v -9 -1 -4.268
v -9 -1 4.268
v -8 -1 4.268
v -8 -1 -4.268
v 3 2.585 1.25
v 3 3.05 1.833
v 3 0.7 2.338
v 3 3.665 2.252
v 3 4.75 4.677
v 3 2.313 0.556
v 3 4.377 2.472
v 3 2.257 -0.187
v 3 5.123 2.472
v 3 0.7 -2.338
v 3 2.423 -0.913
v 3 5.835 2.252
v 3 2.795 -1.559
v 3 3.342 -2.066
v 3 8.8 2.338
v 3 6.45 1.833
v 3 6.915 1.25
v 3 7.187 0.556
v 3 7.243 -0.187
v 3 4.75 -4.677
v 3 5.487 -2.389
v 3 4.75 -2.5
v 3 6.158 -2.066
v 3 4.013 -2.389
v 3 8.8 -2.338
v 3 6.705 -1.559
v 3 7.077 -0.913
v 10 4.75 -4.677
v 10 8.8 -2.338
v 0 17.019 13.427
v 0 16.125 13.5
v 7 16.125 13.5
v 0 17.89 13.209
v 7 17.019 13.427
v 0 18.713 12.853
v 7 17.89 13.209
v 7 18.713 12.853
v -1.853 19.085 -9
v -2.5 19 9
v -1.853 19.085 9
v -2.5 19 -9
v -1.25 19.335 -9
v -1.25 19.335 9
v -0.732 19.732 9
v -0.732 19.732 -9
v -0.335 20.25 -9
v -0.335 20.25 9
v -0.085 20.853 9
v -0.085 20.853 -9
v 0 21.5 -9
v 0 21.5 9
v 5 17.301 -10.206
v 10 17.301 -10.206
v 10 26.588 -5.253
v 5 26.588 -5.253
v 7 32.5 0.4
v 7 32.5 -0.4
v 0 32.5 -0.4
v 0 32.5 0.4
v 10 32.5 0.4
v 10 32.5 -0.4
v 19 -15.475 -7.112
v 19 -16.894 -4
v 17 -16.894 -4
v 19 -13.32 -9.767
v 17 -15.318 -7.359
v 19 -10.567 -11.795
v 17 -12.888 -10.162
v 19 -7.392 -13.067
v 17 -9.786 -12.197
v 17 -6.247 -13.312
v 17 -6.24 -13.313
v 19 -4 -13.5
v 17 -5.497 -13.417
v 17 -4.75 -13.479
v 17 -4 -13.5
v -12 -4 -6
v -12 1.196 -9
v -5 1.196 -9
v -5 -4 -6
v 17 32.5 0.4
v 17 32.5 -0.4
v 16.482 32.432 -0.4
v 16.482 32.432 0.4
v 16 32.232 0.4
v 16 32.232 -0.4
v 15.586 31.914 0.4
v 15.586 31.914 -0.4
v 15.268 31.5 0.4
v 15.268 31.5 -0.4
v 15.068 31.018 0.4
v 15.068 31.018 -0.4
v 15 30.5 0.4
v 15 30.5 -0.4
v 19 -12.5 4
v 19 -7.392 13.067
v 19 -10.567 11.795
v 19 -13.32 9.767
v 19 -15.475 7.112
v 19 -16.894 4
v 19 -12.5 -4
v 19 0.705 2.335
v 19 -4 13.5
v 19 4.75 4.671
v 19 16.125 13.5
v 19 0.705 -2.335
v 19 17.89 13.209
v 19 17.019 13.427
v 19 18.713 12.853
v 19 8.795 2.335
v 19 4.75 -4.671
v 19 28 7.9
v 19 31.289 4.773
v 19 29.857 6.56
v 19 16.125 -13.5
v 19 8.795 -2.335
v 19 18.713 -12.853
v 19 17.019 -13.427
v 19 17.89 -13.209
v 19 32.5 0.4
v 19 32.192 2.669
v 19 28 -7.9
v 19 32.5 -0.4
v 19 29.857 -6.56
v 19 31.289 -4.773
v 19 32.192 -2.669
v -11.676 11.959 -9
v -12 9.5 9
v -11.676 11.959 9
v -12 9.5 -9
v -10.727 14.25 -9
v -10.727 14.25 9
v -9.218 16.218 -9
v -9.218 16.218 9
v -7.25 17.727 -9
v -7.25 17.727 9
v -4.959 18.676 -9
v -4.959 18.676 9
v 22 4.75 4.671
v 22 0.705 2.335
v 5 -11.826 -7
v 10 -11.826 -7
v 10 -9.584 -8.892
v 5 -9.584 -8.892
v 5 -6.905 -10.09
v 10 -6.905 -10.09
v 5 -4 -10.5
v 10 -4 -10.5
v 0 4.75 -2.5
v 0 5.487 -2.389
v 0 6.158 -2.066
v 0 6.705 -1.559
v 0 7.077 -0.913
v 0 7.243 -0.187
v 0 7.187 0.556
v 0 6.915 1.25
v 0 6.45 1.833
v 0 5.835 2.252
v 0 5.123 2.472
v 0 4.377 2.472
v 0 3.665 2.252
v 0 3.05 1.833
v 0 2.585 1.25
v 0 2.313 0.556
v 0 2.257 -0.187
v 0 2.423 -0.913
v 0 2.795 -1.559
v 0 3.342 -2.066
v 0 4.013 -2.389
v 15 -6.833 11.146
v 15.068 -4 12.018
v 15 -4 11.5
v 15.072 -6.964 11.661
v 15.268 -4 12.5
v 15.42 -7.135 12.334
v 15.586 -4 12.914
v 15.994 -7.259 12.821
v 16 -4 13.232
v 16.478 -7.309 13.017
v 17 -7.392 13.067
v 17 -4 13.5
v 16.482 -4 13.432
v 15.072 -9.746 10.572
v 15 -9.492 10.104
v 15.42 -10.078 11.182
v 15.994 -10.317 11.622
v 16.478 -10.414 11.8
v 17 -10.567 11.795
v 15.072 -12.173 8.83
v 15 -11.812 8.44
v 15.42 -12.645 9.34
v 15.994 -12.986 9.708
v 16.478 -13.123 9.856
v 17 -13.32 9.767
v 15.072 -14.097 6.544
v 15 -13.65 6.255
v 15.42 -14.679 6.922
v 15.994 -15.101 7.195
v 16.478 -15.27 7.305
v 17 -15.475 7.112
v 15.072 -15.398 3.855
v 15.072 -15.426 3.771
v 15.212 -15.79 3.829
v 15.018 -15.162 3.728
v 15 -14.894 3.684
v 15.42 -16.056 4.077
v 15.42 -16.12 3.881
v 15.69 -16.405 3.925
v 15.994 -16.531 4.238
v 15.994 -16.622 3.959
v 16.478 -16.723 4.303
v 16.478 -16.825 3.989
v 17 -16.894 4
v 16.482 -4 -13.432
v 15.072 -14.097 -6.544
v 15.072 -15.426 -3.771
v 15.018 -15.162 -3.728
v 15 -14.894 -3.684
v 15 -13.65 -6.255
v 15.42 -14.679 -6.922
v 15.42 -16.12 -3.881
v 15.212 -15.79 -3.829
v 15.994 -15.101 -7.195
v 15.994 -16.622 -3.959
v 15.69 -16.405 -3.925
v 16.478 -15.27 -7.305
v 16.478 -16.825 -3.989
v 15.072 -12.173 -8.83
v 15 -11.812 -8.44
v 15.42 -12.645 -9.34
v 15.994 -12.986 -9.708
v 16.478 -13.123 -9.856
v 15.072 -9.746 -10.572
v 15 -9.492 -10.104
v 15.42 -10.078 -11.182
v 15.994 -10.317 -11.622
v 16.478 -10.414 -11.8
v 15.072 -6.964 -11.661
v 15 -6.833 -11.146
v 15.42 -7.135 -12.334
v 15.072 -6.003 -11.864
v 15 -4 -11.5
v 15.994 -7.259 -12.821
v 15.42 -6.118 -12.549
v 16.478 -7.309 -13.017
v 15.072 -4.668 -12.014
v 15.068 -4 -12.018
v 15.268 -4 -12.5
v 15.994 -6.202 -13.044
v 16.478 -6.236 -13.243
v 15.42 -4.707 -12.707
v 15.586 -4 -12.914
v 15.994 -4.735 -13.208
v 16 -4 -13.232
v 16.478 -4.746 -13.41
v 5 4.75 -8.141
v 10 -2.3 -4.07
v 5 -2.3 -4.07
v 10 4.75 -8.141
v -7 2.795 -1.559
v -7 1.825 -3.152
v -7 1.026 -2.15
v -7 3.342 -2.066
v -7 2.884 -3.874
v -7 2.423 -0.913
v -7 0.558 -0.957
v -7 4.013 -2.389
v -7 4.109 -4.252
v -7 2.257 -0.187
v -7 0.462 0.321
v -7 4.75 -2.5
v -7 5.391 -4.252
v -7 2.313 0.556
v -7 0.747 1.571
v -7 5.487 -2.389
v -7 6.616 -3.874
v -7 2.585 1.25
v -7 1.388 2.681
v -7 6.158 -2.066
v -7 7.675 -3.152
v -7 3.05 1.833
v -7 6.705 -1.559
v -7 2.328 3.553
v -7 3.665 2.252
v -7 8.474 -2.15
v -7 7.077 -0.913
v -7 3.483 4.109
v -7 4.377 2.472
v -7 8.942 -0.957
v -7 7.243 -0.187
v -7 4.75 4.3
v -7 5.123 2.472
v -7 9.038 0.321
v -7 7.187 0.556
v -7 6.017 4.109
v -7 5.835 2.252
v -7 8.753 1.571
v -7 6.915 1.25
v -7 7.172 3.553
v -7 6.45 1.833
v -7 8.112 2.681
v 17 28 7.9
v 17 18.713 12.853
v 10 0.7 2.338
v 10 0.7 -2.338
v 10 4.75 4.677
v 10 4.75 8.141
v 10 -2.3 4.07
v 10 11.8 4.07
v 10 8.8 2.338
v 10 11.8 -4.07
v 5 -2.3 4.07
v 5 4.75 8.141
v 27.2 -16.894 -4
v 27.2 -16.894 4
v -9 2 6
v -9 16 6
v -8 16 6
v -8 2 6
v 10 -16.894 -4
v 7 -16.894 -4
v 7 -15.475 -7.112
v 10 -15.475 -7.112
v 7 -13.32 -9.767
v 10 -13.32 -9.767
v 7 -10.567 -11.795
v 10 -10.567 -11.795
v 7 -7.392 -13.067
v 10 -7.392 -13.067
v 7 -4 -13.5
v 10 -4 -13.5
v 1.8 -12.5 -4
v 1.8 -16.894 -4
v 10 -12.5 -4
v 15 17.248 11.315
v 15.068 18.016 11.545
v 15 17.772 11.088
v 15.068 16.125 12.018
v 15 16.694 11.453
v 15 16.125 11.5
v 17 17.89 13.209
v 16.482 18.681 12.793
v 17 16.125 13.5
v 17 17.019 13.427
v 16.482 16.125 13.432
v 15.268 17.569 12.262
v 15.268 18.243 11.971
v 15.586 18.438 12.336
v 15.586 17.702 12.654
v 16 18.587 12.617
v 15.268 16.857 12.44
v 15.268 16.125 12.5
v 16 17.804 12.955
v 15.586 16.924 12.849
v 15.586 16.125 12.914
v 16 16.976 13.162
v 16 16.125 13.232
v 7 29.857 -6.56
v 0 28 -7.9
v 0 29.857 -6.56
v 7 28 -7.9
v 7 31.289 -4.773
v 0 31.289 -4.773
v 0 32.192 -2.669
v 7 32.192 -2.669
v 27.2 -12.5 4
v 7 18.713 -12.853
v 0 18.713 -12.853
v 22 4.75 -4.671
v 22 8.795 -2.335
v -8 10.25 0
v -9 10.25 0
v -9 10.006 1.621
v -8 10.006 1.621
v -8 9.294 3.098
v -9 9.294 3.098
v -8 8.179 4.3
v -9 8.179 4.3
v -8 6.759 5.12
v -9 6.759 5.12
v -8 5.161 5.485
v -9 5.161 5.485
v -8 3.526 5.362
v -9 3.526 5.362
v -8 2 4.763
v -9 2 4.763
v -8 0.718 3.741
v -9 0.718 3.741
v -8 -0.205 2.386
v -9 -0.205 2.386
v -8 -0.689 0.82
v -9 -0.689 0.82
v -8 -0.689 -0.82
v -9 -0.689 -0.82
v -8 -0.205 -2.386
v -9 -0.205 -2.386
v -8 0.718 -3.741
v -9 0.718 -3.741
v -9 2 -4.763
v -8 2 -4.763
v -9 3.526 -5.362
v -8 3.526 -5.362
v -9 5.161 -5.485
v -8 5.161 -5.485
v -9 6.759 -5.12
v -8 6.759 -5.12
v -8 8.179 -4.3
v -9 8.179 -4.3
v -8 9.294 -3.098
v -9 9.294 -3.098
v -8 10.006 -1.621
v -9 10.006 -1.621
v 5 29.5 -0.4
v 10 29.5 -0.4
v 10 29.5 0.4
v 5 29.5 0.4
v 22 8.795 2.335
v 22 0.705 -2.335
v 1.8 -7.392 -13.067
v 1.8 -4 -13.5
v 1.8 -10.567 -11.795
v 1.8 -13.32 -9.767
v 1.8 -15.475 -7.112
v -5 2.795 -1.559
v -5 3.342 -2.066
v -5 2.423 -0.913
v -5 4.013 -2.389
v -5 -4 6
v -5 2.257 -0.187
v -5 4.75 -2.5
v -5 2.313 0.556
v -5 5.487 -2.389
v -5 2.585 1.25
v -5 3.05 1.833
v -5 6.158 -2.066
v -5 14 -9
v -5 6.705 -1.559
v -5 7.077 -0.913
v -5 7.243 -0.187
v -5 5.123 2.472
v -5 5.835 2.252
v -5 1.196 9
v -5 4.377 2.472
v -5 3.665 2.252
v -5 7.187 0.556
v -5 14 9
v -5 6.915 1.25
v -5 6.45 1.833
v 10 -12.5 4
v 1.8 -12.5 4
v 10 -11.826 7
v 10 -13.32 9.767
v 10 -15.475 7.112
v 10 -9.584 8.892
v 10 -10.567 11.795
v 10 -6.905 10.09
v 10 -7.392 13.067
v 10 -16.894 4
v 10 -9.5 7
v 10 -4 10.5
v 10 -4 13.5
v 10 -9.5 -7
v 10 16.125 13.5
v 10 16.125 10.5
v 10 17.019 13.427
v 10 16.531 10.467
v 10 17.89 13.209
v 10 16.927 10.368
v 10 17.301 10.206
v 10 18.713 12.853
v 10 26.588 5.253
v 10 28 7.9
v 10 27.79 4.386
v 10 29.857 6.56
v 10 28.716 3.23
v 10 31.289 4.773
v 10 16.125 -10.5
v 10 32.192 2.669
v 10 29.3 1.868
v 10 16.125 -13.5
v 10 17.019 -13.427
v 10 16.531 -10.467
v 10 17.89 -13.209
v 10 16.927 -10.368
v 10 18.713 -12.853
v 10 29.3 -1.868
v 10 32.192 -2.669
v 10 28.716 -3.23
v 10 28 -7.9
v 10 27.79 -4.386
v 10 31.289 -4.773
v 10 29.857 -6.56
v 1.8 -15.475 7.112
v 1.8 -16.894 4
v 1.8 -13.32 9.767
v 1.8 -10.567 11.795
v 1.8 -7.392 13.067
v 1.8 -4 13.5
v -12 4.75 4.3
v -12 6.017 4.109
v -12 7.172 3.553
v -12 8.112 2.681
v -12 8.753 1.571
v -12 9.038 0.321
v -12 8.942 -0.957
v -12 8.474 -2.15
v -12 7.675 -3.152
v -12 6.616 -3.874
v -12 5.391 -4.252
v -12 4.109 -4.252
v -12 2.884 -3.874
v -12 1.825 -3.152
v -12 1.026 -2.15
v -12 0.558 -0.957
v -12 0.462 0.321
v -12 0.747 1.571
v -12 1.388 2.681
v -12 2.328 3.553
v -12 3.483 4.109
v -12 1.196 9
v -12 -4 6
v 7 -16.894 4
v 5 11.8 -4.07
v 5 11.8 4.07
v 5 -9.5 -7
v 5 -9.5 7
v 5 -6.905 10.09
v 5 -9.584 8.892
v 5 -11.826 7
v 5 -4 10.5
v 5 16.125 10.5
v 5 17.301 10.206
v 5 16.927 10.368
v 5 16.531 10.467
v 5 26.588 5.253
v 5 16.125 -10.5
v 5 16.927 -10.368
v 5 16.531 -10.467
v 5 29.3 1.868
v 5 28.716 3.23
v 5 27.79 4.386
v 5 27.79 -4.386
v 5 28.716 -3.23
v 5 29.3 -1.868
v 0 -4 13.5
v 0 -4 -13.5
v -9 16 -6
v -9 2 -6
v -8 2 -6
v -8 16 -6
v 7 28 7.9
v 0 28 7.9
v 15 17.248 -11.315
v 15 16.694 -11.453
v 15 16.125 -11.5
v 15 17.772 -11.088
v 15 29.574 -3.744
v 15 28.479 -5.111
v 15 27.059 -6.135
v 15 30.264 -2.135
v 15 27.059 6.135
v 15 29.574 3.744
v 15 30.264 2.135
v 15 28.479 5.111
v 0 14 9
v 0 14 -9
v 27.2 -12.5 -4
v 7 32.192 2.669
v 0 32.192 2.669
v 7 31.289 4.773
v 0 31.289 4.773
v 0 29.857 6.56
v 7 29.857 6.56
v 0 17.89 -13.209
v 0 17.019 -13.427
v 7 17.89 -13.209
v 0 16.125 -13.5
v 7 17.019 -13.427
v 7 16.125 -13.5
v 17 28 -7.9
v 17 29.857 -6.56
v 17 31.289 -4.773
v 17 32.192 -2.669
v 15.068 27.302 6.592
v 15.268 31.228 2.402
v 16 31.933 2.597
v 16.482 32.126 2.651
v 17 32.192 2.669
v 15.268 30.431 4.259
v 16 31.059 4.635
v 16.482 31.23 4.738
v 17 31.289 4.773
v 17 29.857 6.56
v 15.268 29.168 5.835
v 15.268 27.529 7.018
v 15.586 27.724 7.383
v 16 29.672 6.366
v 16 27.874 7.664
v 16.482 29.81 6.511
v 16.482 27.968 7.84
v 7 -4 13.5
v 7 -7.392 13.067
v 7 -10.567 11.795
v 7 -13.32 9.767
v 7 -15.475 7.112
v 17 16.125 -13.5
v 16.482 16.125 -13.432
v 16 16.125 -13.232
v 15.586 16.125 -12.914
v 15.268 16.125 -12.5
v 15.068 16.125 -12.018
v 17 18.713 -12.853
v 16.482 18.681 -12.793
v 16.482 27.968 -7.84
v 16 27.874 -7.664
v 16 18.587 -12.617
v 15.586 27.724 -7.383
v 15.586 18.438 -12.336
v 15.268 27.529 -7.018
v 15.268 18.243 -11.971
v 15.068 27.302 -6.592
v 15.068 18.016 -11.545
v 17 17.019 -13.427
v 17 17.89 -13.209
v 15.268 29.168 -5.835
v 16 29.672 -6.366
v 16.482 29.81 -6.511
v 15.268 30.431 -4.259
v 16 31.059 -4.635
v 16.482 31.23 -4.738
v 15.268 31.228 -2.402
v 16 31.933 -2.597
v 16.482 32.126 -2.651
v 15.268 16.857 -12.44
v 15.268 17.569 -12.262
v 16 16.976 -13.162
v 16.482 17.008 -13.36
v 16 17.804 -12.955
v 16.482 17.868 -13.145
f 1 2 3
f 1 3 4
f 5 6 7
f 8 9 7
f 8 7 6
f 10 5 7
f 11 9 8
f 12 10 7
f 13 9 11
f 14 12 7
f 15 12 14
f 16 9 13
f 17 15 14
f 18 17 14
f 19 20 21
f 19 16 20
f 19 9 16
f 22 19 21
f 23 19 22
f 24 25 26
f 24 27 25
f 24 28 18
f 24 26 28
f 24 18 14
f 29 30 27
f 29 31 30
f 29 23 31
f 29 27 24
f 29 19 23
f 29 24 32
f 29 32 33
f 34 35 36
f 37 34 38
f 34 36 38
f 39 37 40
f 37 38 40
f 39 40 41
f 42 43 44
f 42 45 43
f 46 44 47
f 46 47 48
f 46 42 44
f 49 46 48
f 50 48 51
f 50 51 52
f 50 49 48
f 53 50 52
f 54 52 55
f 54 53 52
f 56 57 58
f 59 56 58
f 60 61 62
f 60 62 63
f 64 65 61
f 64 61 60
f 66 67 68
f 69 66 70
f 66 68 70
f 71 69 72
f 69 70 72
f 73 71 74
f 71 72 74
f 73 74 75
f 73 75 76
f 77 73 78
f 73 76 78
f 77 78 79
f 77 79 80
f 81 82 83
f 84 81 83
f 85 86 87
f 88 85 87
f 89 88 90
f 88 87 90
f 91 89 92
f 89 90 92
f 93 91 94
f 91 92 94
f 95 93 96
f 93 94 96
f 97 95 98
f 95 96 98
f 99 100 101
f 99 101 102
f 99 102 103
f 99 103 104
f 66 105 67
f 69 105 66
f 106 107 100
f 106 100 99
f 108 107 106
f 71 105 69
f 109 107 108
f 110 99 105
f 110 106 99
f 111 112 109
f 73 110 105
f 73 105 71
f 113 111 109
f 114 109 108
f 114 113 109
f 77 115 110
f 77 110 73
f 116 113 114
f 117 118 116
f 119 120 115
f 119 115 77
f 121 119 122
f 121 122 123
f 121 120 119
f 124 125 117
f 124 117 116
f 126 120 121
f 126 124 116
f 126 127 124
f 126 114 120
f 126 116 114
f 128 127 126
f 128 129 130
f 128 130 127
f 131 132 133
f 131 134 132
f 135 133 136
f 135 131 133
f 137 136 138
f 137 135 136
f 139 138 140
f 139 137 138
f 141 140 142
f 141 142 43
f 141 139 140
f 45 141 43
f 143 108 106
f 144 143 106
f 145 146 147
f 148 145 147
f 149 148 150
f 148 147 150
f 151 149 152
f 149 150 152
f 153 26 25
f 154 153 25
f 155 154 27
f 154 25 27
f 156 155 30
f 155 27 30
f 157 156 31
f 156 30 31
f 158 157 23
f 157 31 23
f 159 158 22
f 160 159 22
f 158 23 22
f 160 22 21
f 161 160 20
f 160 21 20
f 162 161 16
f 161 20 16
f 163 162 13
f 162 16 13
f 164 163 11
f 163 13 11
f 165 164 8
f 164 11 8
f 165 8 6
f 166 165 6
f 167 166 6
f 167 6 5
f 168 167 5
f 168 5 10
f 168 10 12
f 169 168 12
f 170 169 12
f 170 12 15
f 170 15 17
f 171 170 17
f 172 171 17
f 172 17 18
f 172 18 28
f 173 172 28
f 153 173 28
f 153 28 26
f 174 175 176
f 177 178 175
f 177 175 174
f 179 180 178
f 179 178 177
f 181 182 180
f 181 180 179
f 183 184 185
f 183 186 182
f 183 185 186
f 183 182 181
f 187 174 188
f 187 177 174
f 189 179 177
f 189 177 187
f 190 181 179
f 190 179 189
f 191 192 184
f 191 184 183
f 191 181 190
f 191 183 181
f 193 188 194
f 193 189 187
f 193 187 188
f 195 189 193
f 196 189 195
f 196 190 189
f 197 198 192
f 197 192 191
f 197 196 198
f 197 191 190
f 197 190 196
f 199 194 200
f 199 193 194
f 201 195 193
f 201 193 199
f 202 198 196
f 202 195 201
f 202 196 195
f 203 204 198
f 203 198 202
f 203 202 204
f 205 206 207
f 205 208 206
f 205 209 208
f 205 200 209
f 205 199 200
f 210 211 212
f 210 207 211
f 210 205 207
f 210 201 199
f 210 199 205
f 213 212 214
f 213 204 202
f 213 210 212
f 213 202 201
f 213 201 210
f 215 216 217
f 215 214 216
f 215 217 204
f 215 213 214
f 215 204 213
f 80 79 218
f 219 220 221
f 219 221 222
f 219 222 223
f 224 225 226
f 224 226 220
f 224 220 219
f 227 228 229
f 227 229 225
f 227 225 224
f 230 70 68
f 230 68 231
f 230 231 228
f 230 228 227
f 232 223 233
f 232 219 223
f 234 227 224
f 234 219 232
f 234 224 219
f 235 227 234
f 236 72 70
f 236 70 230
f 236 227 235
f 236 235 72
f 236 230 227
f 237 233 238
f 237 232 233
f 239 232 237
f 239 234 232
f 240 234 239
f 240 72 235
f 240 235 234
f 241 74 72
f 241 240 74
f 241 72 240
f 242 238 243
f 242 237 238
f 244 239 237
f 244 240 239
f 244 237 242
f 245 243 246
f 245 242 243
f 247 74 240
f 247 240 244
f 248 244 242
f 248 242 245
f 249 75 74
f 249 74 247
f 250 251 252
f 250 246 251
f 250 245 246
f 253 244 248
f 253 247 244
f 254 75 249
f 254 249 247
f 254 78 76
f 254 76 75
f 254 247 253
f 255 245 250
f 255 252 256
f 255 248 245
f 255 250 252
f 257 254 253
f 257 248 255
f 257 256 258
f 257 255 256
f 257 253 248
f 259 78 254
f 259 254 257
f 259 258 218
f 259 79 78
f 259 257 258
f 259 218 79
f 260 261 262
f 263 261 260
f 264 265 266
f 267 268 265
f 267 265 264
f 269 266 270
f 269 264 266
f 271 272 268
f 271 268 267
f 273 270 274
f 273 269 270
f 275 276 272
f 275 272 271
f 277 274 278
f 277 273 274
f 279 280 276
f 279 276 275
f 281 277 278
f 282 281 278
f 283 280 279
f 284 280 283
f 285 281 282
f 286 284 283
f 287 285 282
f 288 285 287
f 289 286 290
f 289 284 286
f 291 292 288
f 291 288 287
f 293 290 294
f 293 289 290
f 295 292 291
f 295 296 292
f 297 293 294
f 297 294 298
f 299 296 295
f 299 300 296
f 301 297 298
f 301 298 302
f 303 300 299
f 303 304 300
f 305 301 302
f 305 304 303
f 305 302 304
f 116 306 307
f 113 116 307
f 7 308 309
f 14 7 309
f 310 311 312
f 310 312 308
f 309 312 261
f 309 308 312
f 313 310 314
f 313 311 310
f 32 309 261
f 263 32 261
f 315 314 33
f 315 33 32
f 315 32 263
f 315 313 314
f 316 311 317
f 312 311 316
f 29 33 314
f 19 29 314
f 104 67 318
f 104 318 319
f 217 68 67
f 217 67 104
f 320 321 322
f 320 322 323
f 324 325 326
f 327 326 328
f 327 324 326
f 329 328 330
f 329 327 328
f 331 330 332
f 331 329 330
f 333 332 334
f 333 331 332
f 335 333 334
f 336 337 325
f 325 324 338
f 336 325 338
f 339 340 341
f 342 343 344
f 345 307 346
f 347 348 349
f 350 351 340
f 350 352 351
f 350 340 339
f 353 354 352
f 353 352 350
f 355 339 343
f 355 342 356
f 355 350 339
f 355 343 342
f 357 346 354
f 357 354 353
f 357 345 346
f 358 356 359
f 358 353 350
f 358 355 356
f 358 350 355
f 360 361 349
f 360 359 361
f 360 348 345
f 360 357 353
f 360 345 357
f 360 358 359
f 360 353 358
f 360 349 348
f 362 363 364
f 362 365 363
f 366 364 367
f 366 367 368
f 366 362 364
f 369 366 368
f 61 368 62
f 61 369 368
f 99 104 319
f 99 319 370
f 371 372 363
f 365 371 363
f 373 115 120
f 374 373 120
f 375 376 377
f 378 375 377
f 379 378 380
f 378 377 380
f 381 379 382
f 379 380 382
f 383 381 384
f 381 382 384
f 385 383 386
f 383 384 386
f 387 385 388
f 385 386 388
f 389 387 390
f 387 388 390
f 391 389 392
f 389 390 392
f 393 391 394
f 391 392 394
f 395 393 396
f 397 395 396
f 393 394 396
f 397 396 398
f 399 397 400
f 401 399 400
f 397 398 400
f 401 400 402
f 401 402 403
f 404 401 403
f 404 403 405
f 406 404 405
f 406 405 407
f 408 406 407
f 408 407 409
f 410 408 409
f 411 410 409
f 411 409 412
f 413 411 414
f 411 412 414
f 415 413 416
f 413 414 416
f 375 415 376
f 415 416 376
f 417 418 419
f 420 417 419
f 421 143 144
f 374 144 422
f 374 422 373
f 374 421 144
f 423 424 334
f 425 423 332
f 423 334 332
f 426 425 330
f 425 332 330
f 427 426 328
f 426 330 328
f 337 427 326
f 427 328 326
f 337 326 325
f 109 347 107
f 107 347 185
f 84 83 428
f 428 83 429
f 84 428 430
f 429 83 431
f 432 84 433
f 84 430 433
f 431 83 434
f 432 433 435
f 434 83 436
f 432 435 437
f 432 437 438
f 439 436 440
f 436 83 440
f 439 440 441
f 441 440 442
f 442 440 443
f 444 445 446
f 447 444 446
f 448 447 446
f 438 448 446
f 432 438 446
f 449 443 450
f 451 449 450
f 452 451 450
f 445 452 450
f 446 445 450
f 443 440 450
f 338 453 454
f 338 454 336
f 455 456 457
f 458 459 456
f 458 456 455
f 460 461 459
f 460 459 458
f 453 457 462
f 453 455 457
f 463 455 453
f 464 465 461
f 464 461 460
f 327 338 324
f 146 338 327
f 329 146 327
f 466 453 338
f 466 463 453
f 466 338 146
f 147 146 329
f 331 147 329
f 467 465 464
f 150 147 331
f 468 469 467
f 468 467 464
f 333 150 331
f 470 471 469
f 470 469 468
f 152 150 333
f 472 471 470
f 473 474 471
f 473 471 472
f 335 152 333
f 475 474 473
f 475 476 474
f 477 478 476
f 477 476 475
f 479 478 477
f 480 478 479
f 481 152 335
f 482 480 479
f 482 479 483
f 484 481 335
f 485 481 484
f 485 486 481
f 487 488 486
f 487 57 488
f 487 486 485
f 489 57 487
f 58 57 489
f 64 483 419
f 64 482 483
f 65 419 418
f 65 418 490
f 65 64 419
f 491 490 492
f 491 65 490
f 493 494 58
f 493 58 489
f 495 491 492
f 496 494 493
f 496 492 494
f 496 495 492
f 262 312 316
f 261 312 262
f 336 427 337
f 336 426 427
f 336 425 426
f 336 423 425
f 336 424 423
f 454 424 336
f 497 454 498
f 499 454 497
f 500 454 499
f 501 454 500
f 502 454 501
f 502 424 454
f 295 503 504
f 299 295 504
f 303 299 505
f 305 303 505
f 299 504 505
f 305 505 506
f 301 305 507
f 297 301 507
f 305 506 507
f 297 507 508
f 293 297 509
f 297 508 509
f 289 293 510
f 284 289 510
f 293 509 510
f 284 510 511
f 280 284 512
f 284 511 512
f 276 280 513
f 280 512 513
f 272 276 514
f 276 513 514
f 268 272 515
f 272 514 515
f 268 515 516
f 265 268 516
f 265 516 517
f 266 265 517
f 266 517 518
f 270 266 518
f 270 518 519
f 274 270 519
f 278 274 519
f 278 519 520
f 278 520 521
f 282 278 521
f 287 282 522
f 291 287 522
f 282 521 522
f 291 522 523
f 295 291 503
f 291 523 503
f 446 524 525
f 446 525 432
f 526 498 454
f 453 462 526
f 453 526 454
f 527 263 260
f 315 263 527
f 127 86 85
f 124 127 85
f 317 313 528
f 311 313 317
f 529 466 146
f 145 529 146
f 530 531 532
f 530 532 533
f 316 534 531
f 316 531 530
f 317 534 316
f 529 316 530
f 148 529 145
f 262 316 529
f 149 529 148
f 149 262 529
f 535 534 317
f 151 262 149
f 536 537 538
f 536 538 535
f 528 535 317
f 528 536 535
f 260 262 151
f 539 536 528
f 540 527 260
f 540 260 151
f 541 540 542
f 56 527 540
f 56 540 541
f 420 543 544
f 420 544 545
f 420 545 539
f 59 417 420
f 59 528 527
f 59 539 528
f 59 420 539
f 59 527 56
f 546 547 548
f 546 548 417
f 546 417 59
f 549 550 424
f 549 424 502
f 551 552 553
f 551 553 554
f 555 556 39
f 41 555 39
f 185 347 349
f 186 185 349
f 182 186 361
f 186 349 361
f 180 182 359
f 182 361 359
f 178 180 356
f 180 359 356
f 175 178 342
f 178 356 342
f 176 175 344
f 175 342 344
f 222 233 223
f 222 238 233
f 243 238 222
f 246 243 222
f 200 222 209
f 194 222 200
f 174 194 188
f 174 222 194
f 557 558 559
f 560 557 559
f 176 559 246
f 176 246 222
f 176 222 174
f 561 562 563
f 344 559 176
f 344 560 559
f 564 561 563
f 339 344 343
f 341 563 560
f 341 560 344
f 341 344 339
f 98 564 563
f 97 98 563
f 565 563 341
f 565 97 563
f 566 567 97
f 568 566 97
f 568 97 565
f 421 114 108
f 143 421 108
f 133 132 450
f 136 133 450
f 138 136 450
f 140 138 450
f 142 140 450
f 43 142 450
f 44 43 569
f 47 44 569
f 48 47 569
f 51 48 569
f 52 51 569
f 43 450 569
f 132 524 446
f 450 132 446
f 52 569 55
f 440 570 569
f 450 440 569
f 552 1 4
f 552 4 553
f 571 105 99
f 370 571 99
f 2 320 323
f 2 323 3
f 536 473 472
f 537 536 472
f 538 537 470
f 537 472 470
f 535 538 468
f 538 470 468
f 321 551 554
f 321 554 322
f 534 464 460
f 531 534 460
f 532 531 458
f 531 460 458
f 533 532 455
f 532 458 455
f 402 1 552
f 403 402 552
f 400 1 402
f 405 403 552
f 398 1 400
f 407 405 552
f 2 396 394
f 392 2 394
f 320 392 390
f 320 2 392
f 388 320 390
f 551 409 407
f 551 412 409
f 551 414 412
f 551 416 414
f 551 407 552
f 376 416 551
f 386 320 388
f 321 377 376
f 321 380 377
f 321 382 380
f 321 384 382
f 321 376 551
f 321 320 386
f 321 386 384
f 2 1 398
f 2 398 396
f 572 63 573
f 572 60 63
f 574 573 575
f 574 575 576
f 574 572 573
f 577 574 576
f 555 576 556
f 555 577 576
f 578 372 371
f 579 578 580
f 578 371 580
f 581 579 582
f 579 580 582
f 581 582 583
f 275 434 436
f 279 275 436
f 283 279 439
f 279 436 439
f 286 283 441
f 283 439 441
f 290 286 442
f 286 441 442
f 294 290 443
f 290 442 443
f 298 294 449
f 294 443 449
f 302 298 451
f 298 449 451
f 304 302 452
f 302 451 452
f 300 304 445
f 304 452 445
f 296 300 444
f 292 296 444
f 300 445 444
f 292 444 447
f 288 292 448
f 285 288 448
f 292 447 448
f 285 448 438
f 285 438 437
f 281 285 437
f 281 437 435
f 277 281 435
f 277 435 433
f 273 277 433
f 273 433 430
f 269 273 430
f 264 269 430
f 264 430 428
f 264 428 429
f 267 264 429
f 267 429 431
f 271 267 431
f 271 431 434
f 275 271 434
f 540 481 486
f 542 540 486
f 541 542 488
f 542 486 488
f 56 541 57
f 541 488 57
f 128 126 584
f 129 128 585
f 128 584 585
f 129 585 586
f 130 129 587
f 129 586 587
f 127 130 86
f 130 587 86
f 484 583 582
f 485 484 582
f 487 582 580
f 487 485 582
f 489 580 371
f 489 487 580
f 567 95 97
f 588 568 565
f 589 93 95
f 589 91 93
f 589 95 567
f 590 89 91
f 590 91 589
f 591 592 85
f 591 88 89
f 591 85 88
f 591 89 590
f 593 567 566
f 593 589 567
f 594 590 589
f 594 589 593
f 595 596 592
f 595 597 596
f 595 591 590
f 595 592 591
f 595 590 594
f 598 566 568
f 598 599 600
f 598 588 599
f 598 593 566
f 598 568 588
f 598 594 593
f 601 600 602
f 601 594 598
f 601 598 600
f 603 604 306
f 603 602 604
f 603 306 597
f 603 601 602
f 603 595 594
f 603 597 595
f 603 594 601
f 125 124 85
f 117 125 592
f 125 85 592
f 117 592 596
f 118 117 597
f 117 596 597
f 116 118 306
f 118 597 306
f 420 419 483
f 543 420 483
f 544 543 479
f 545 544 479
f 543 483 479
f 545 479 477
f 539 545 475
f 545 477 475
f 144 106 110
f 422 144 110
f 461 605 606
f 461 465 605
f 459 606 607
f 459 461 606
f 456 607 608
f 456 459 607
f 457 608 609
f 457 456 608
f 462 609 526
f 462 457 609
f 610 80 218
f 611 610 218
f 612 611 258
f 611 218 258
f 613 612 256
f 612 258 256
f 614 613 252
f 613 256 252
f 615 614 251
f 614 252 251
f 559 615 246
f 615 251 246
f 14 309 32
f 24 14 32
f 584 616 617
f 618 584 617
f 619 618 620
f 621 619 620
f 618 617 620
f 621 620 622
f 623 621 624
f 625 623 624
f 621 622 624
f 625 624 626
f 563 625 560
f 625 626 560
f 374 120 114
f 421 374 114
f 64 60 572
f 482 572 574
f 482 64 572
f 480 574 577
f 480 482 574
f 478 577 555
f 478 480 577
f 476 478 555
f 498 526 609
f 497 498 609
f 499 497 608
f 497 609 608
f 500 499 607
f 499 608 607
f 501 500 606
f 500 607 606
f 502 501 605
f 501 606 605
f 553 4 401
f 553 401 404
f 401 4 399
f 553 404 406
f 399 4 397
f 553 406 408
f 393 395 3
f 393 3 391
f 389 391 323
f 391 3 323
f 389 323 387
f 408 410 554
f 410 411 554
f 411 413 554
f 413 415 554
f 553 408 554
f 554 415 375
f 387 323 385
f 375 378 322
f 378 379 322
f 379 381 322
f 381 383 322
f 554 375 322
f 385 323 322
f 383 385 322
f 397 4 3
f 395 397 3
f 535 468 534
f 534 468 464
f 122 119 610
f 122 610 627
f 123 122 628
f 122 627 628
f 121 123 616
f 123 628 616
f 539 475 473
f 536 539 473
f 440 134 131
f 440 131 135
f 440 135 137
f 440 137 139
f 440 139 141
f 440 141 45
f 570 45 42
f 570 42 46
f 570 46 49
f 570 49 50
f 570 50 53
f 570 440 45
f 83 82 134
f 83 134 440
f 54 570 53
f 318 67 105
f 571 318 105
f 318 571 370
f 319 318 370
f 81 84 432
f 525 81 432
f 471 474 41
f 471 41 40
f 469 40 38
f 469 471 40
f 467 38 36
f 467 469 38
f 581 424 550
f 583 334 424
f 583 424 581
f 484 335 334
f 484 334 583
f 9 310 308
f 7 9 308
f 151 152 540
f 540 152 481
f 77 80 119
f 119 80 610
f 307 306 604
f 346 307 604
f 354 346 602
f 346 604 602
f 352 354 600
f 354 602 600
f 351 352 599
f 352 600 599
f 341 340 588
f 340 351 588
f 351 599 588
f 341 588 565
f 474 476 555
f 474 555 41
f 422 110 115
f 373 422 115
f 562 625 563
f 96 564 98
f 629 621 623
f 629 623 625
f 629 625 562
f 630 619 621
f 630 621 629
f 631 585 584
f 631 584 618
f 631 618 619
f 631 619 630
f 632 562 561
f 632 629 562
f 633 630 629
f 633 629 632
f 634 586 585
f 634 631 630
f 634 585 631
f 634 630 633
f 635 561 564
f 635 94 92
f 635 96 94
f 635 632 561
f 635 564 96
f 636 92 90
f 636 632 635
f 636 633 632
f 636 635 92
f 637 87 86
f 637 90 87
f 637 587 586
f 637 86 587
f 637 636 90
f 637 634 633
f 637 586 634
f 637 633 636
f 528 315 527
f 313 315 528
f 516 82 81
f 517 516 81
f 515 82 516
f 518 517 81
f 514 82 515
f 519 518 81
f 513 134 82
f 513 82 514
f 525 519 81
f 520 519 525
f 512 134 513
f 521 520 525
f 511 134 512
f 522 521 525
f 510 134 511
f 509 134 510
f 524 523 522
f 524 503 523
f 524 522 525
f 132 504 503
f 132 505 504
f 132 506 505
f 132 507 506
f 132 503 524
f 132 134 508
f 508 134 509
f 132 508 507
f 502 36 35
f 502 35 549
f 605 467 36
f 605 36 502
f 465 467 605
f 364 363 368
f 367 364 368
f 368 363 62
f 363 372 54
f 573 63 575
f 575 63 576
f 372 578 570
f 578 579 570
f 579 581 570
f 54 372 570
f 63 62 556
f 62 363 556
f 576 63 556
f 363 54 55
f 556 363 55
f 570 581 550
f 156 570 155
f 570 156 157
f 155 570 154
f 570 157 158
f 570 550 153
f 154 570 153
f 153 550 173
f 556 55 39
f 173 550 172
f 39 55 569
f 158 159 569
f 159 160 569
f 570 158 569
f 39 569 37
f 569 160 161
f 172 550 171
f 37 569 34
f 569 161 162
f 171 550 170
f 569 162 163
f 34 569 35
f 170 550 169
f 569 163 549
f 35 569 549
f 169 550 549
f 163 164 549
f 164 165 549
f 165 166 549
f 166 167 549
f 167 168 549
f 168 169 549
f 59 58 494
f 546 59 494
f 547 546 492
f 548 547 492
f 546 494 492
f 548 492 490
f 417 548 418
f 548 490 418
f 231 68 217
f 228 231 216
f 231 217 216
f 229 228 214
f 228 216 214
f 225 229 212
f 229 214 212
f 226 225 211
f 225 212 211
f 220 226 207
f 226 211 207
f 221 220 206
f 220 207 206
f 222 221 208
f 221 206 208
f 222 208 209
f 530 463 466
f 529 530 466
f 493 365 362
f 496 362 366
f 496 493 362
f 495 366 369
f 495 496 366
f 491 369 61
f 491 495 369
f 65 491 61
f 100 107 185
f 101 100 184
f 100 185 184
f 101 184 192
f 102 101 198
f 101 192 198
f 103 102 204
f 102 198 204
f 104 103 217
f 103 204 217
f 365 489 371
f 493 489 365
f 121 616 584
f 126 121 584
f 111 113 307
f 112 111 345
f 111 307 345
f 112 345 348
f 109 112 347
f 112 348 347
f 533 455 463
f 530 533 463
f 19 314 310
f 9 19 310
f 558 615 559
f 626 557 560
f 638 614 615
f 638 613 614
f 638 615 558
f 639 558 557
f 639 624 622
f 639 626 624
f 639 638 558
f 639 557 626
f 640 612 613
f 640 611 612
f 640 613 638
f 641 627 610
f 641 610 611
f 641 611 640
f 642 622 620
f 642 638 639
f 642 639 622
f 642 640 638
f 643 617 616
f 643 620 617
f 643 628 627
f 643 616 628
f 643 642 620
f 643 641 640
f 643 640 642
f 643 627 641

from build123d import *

# Parameters (mm, degrees)
BOSS_EXTRUDE1_DEPTH = 7
FILLET1_R           = 8.5
FILLET2_R           = 5.5
FILLET3_R           = 13.5
SKETCH3_W           = 27
SKETCH3_H           = 13.5
CUT_EXTRUDE1_DEPTH  = 1.8
BOSS_EXTRUDE2_DEPTH = 5
BOSS_EXTRUDE3_DEPTH = 7
SKETCH10_R          = 2.5
CUT_EXTRUDE3_DEPTH  = 21
CUT_EXTRUDE16_REACH = 42.725
SKETCH19_W          = 12
SKETCH19_H          = 4.5
CHAMFER5_SIZE       = 3
CHAMFER5_SIZE2      = 5.196152423
CUT_EXTRUDE17_DEPTH = 4
SHELL1_START        = -9
SHELL1_OUTLINE_R    = 5.5
SHELL1_DEPTH        = 1
SKETCH21_R          = 4.3
CUT_EXTRUDE18_DEPTH = 5
FILLET5_R           = 9.5
FILLET6_R           = 2.5
BOSS_EXTRUDE5_START = 3
BOSS_EXTRUDE5_DEPTH = 3
SKETCH24_W          = 8
SKETCH24_H          = 10
CUT_EXTRUDE19_DEPTH = 8.2
CUT_EXTRUDE20_DEPTH = 5
BOSS_EXTRUDE6_DEPTH = 4
SKETCH27_W          = 8
SKETCH27_H          = 4.393796958
BOSS_EXTRUDE8_DEPTH = 12.2
BOSS_EXTRUDE9_DEPTH = 3
FILLET8_R           = 2


# Read off the part's stored shape, not the designer's step: Shell1
# Some blends are built 0.0001 mm under size
with BuildPart() as part:
    # Sketch2 → Boss-Extrude1 (new body)
    with BuildSketch(Plane(origin=(0, 0, 0), x_dir=(0, 0, -1), z_dir=(1, 0, 0))):
        Polygon((-13.5, -17.5), (13.5, -17.5), (13.5, 17.5), (5.5, 32.5), (-5.5, 32.5), (-13.5, 17.5), align=None)
    extrude(amount=BOSS_EXTRUDE1_DEPTH)

    # Fillet1
    fillet1_edges = [part.edges().sort_by_distance(p)[0] for p in [
        (3.5, 32.5, 5.5),
        (3.5, 32.5, -5.5),
    ]]
    fillet(fillet1_edges, radius=FILLET1_R)

    # Fillet2
    fillet2_edges = [part.edges().sort_by_distance(p)[0] for p in [
        (3.5, 17.5, -13.5),
        (3.5, 17.5, 13.5),
    ]]
    fillet(fillet2_edges, radius=FILLET2_R)

    # Fillet3
    fillet3_edges = [part.edges().sort_by_distance(p)[0] for p in [
        (3.5, -17.5, 13.5),
        (3.5, -17.5, -13.5),
    ]]
    fillet(fillet3_edges, radius=FILLET3_R - 0.0001)  # a hair under: the kernel refuses the full size

    # Sketch3 → Cut-Extrude1 (cut)
    with BuildSketch(Plane.ZY):
        with Locations((0, -10.75)):
            Rectangle(SKETCH3_W, SKETCH3_H)
    extrude(amount=-CUT_EXTRUDE1_DEPTH, mode=Mode.SUBTRACT)

    # Sketch6 → Boss-Extrude2 (add)
    with BuildSketch(Plane.ZY):
        with BuildLine():
            Line((-13.5, 14), (13.5, 14))
            Line((13.5, 14), (13.5, 16.125))
            ThreePointArc((13.5, 16.125), (13.293303509, 17.618632471), (12.688749833, 19))
            Line((12.688749833, 19), (-12.688749833, 19))
            ThreePointArc((-12.688749833, 19), (-13.293303509, 17.618632471), (-13.5, 16.125))
            Line((-13.5, 16.125), (-13.5, 14))
        make_face()
    extrude(amount=BOSS_EXTRUDE2_DEPTH)

    # Sketch9 → Boss-Extrude3 (add)
    with BuildSketch(Plane.ZY.offset(5)):
        with BuildLine():
            Line((-13.5, 14), (-13.5, -4))
            Line((-13.5, -4), (13.5, -4))
            Line((13.5, -4), (13.5, 14))
            Line((13.5, 14), (13.5, 16.125))
            ThreePointArc((13.5, 16.125), (13.293303509, 17.618632471), (12.688749833, 19))
            Line((12.688749833, 19), (-12.688749833, 19))
            ThreePointArc((-12.688749833, 19), (-13.293303509, 17.618632471), (-13.5, 16.125))
            Line((-13.5, 16.125), (-13.5, 14))
        make_face()
    extrude(amount=BOSS_EXTRUDE3_DEPTH)

    # Sketch10 → Cut-Extrude3 (cut)
    with BuildSketch(Plane(origin=(7, 0, 0), x_dir=(0, 0, -1), z_dir=(1, 0, 0))):
        with Locations((0, 4.75)):
            Circle(SKETCH10_R)
    extrude(amount=-CUT_EXTRUDE3_DEPTH, mode=Mode.SUBTRACT)

    # Sketch19 → Cut-Extrude16 (cut, up to next)
    with BuildSketch(Plane.XZ.offset(4), mode=Mode.PRIVATE) as cut_extrude16_sk1:
        with Locations((-6, -11.25)):
            Rectangle(SKETCH19_W, SKETCH19_H)
    cut_extrude16_tool1 = extrude(cut_extrude16_sk1.sketch, amount=-CUT_EXTRUDE16_REACH, mode=Mode.PRIVATE) & part.part
    # Sketch19 → Cut-Extrude16 (cut, up to next)
    with BuildSketch(Plane.XZ.offset(4), mode=Mode.PRIVATE) as cut_extrude16_sk2:
        with Locations((-6, 11.25)):
            Rectangle(SKETCH19_W, SKETCH19_H)
    cut_extrude16_tool2 = extrude(cut_extrude16_sk2.sketch, amount=-CUT_EXTRUDE16_REACH, mode=Mode.PRIVATE) & part.part
    add(cut_extrude16_tool1.solids().sort_by_distance((-6, -4, -11.25))[0], mode=Mode.SUBTRACT)
    add(cut_extrude16_tool2.solids().sort_by_distance((-6, -4, 11.25))[0], mode=Mode.SUBTRACT)

    # Chamfer5
    chamfer5_edges = [part.edges().sort_by_distance(p)[0] for p in [
        (-8.5, -4, -9),
        (-8.5, -4, 9),
    ]]
    chamfer5_side = [part.faces().sort_by_distance(p)[0] for p in [
        (-8.5, -4, 0),
    ]]
    chamfer(chamfer5_edges, length=CHAMFER5_SIZE, length2=CHAMFER5_SIZE2, reference=chamfer5_side[0])

    # Sketch20 → Cut-Extrude17 (cut)
    with BuildSketch(Plane(origin=(7, 0, 0), x_dir=(0, 0, -1), z_dir=(1, 0, 0))):
        Polygon((2.33826859, 8.8), (-2.33826859, 8.8), (-4.67653718, 4.75), (-2.33826859, 0.7), (2.33826859, 0.7), (4.67653718, 4.75), align=None)
    extrude(amount=-CUT_EXTRUDE17_DEPTH, mode=Mode.SUBTRACT)

    # Shell1 outline → Shell1 (cut)
    with BuildSketch(Plane.YZ.offset(SHELL1_START)):
        Polygon((16, -6), (16, 6), (2, 6), (-1, 4.267949192), (-1, -4.267949192), (2, -6), align=None)
        with Locations((4.75, 0)):
            Circle(SHELL1_OUTLINE_R, mode=Mode.SUBTRACT)
    extrude(amount=SHELL1_DEPTH, mode=Mode.SUBTRACT)

    # Sketch21 → Cut-Extrude18 (cut)
    with BuildSketch(Plane.ZY.offset(12)):
        with Locations((0, 4.75)):
            Circle(SKETCH21_R)
    extrude(amount=-CUT_EXTRUDE18_DEPTH, mode=Mode.SUBTRACT)

    # Fillet5
    fillet5_edges = [part.edges().sort_by_distance(p)[0] for p in [
        (-12, 19, 0),
    ]]
    fillet(fillet5_edges, radius=FILLET5_R)

    # Fillet6
    fillet6_edges = [part.edges().sort_by_distance(p)[0] for p in [
        (0, 19, 0),
    ]]
    fillet(fillet6_edges, radius=FILLET6_R - 0.0001)  # a hair under: the kernel refuses the full size

    # Sketch23 → Boss-Extrude5 (add)
    with BuildSketch(Plane(origin=(7, 0, 0), x_dir=(0, 0, -1), z_dir=(1, 0, 0)).offset(BOSS_EXTRUDE5_START)):
        with BuildLine():
            Line((-13.5, 16.125), (-13.5, -4))
            ThreePointArc((-13.5, -4), (-9.545941546, -13.545941546), (0, -17.5))
            ThreePointArc((0, -17.5), (9.545941546, -13.545941546), (13.5, -4))
            Line((13.5, -4), (13.5, 16.125))
            ThreePointArc((13.5, 16.125), (13.335783751, 17.458945938), (12.852941176, 18.713235294))
            Line((12.852941176, 18.713235294), (7.9, 28))
            ThreePointArc((7.9, 28), (4.773213921, 31.288689869), (0.4, 32.5))
            Line((0.4, 32.5), (-0.4, 32.5))
            ThreePointArc((-0.4, 32.5), (-4.773213921, 31.288689869), (-7.9, 28))
            Line((-7.9, 28), (-12.852941176, 18.713235294))
            ThreePointArc((-12.852941176, 18.713235294), (-13.335783751, 17.458945938), (-13.5, 16.125))
        make_face()
        Polygon((-4.67653718, 4.75), (-2.33826859, 0.7), (2.33826859, 0.7), (4.67653718, 4.75), (2.33826859, 8.8), (-2.33826859, 8.8), align=None, mode=Mode.SUBTRACT)
    extrude(amount=-BOSS_EXTRUDE5_DEPTH)

    # Sketch24 → Cut-Extrude19 (cut)
    with BuildSketch(Plane(origin=(10, 0, 0), x_dir=(0, 0, -1), z_dir=(1, 0, 0))):
        with Locations((0, -17.5)):
            Rectangle(SKETCH24_W, SKETCH24_H)
    extrude(amount=-CUT_EXTRUDE19_DEPTH, mode=Mode.SUBTRACT)

    # Sketch25 → Cut-Extrude20 (cut)
    with BuildSketch(Plane(origin=(10, 0, 0), x_dir=(0, 0, -1), z_dir=(1, 0, 0))):
        with BuildLine():
            Line((7, -9.5), (7, -11.826237921))
            ThreePointArc((7, -11.826237921), (9.585144756, -8.28660705), (10.5, -4))
            Line((10.5, -4), (10.5, 16.125))
            ThreePointArc((10.5, 16.125), (10.42535625, 16.731339063), (10.205882353, 17.301470588))
            Line((10.205882353, 17.301470588), (5.252941176, 26.588235294))
            ThreePointArc((5.252941176, 26.588235294), (3.229726655, 28.716211091), (0.4, 29.5))
            Line((0.4, 29.5), (-0.4, 29.5))
            ThreePointArc((-0.4, 29.5), (-3.229726655, 28.716211091), (-5.252941176, 26.588235294))
            Line((-5.252941176, 26.588235294), (-10.205882353, 17.301470588))
            ThreePointArc((-10.205882353, 17.301470588), (-10.42535625, 16.731339063), (-10.5, 16.125))
            Line((-10.5, 16.125), (-10.5, -4))
            ThreePointArc((-10.5, -4), (-9.585144756, -8.28660705), (-7, -11.826237921))
            Line((-7, -11.826237921), (-7, -9.5))
            Line((-7, -9.5), (7, -9.5))
        make_face()
        Polygon((4.070319398, 11.8), (-4.070319398, 11.8), (-8.140638796, 4.75), (-4.070319398, -2.3), (4.070319398, -2.3), (8.140638796, 4.75), align=None, mode=Mode.SUBTRACT)
    extrude(amount=-CUT_EXTRUDE20_DEPTH, mode=Mode.SUBTRACT)


with BuildPart() as body_2:
    # Sketch26 → Boss-Extrude6 (new body)
    with BuildSketch(Plane(origin=(15, 0, 0), x_dir=(0, 0, -1), z_dir=(1, 0, 0))):
        with BuildLine():
            Line((4, -12.5), (4, -16.893796958))
            ThreePointArc((4, -16.893796958), (10.86853256, -12.007808689), (13.5, -4))
            Line((13.5, -4), (13.5, 16.125))
            ThreePointArc((13.5, 16.125), (13.335783751, 17.458945938), (12.852941176, 18.713235294))
            Line((12.852941176, 18.713235294), (7.9, 28))
            ThreePointArc((7.9, 28), (4.773213921, 31.288689869), (0.4, 32.5))
            Line((0.4, 32.5), (-0.4, 32.5))
            ThreePointArc((-0.4, 32.5), (-4.773213921, 31.288689869), (-7.9, 28))
            Line((-7.9, 28), (-12.852941176, 18.713235294))
            ThreePointArc((-12.852941176, 18.713235294), (-13.335783751, 17.458945938), (-13.5, 16.125))
            Line((-13.5, 16.125), (-13.5, -4))
            ThreePointArc((-13.5, -4), (-10.86853256, -12.007808689), (-4, -16.893796958))
            Line((-4, -16.893796958), (-4, -12.5))
            Line((-4, -12.5), (4, -12.5))
        make_face()
    extrude(amount=BOSS_EXTRUDE6_DEPTH)

    # Sketch27 → Boss-Extrude8 (add)
    with BuildSketch(Plane.ZY.offset(-15)):
        with Locations((0, -14.696898479)):
            Rectangle(SKETCH27_W, SKETCH27_H)
    extrude(amount=-BOSS_EXTRUDE8_DEPTH)

    # Sketch28 → Boss-Extrude9 (add)
    with BuildSketch(Plane(origin=(19, 0, 0), x_dir=(0, 0, -1), z_dir=(1, 0, 0))):
        Polygon((2.335381839, 8.795), (-2.335381839, 8.795), (-4.670763678, 4.75), (-2.335381839, 0.705), (2.335381839, 0.705), (4.670763678, 4.75), align=None)
    extrude(amount=BOSS_EXTRUDE9_DEPTH)

    # Fillet8
    # the kernel refuses this fillet: 2 mm, written as the material it takes off along each edge
    with BuildSketch(Plane(origin=(15, -4, 0), x_dir=(0, 0, 1), z_dir=(0, 1, 0))) as fillet8_piece_1:
        with BuildLine():
            CenterArc((13.5 - FILLET8_R, FILLET8_R), FILLET8_R, 270, 90)
            Line((13.5 - FILLET8_R, 0), (13.5, 0))
            Line((13.5, 0), (13.5, FILLET8_R))
        make_face()
    revolve(axis=Axis((15, -4, 0), (1, 0, 0)), revolution_arc=93.990945472, mode=Mode.SUBTRACT)
    with BuildSketch(Plane(origin=(15, 16.125, 13.5), x_dir=(1, 0, 0), z_dir=(0, -1, 0))) as fillet8_piece_2:
        with BuildLine():
            CenterArc((FILLET8_R, -FILLET8_R), FILLET8_R, 90, 90)
            Line((0, -FILLET8_R), (0, 0))
            Line((0, 0), (FILLET8_R, 0))
        make_face()
    extrude(amount=20.125, mode=Mode.SUBTRACT)
    with BuildSketch(Plane(origin=(15, 16.125, 8), x_dir=(0, 0.47058823529411903, 0.8823529411764699), z_dir=(0, 0.8823529411764699, -0.47058823529411903))) as fillet8_piece_3:
        with BuildLine():
            CenterArc((5.5 - FILLET8_R, FILLET8_R), FILLET8_R, 270, 90)
            Line((5.5 - FILLET8_R, 0), (5.5, 0))
            Line((5.5, 0), (5.5, FILLET8_R))
        make_face()
    revolve(axis=Axis((15, 16.125, 8), (1, 0, 0)), revolution_arc=28.072486936, mode=Mode.SUBTRACT)
    with BuildSketch(Plane(origin=(15, 28, 7.9), x_dir=(0, -0.47058823529411736, -0.8823529411764708), z_dir=(0, -0.8823529411764708, 0.4705882352941174)), Plane(origin=(15, 18.713235294, -12.852941176), x_dir=(0, -0.4705882352941178, 0.8823529411764706), z_dir=(0, 0.8823529411764706, 0.47058823529411786))) as fillet8_piece_4:
        with BuildLine():
            CenterArc((FILLET8_R, FILLET8_R), FILLET8_R, 180, 90)
            Line((0, FILLET8_R), (0, 0))
            Line((0, 0), (FILLET8_R, 0))
        make_face()
    extrude(amount=10.525, mode=Mode.SUBTRACT)
    with BuildSketch(Plane(origin=(15, 24, 0.4), x_dir=(0, 1, 0), z_dir=(0, 0, -1))) as fillet8_piece_5:
        with BuildLine():
            CenterArc((8.5 - FILLET8_R, FILLET8_R), FILLET8_R, 270, 90)
            Line((8.5, FILLET8_R), (8.5, 0))
            Line((8.5, 0), (8.5 - FILLET8_R, 0))
        make_face()
    revolve(axis=Axis((15, 24, 0.4), (1, 0, 0)), revolution_arc=61.927513064, mode=Mode.SUBTRACT)
    with BuildSketch(Plane(origin=(15, 32.5, -0.4), x_dir=(0, -1, 0), z_dir=(0, 0, 1))) as fillet8_piece_6:
        with BuildLine():
            CenterArc((FILLET8_R, FILLET8_R), FILLET8_R, 180, 90)
            Line((0, FILLET8_R), (0, 0))
            Line((0, 0), (FILLET8_R, 0))
        make_face()
    extrude(amount=0.8, mode=Mode.SUBTRACT)
    with BuildSketch(Plane(origin=(15, 24, -0.4), x_dir=(0, 0.4705882352941177, -0.8823529411764706), z_dir=(0, -0.8823529411764706, -0.4705882352941177))) as fillet8_piece_7:
        with BuildLine():
            CenterArc((8.5 - FILLET8_R, FILLET8_R), FILLET8_R, 270, 90)
            Line((8.5, FILLET8_R), (8.5, 0))
            Line((8.5, 0), (8.5 - FILLET8_R, 0))
        make_face()
    revolve(axis=Axis((15, 24, -0.4), (1, 0, 0)), revolution_arc=61.927513064, mode=Mode.SUBTRACT)
    with BuildSketch(Plane(origin=(15, 16.125, -8), x_dir=(0, 0, -1), z_dir=(0, -1, 0))) as fillet8_piece_8:
        with BuildLine():
            CenterArc((5.5 - FILLET8_R, FILLET8_R), FILLET8_R, 270, 90)
            Line((5.5, FILLET8_R), (5.5, 0))
            Line((5.5, 0), (5.5 - FILLET8_R, 0))
        make_face()
    revolve(axis=Axis((15, 16.125, -8), (1, 0, 0)), revolution_arc=28.072486936, mode=Mode.SUBTRACT)
    with BuildSketch(Plane(origin=(15, -4, -13.5), x_dir=(0, 0, 1), z_dir=(0, 1, 0))) as fillet8_piece_9:
        with BuildLine():
            CenterArc((FILLET8_R, FILLET8_R), FILLET8_R, 180, 90)
            Line((0, FILLET8_R), (0, 0))
            Line((0, 0), (FILLET8_R, 0))
        make_face()
    extrude(amount=20.125, mode=Mode.SUBTRACT)
    with BuildSketch(Plane(origin=(15, -4, 0), x_dir=(0, -0.9975750615108255, 0.06959882651074423), z_dir=(0, 0.06959882651074423, 0.9975750615108255))) as fillet8_piece_10:
        with BuildLine():
            CenterArc((13.5 - FILLET8_R, FILLET8_R), FILLET8_R, 270, 90)
            Line((13.5, FILLET8_R), (13.5, 0))
            Line((13.5, 0), (13.5 - FILLET8_R, 0))
        make_face()
    revolve(axis=Axis((15, -4, 0), (1, 0, 0)), revolution_arc=93.990945472, mode=Mode.SUBTRACT)
    with BuildSketch(Plane(origin=(15, -16.893796958, 9), x_dir=(0, 1, 0), z_dir=(0, 0, -1))) as fillet8_piece_11:
        with BuildLine():
            CenterArc((FILLET8_R, FILLET8_R), FILLET8_R, 180, 90)
            Line((0, FILLET8_R), (0, 0))
            Line((0, 0), (FILLET8_R, 0))
        make_face()
    extrude(amount=18, mode=Mode.SUBTRACT)


solid = Compound([part.part, body_2.part])
